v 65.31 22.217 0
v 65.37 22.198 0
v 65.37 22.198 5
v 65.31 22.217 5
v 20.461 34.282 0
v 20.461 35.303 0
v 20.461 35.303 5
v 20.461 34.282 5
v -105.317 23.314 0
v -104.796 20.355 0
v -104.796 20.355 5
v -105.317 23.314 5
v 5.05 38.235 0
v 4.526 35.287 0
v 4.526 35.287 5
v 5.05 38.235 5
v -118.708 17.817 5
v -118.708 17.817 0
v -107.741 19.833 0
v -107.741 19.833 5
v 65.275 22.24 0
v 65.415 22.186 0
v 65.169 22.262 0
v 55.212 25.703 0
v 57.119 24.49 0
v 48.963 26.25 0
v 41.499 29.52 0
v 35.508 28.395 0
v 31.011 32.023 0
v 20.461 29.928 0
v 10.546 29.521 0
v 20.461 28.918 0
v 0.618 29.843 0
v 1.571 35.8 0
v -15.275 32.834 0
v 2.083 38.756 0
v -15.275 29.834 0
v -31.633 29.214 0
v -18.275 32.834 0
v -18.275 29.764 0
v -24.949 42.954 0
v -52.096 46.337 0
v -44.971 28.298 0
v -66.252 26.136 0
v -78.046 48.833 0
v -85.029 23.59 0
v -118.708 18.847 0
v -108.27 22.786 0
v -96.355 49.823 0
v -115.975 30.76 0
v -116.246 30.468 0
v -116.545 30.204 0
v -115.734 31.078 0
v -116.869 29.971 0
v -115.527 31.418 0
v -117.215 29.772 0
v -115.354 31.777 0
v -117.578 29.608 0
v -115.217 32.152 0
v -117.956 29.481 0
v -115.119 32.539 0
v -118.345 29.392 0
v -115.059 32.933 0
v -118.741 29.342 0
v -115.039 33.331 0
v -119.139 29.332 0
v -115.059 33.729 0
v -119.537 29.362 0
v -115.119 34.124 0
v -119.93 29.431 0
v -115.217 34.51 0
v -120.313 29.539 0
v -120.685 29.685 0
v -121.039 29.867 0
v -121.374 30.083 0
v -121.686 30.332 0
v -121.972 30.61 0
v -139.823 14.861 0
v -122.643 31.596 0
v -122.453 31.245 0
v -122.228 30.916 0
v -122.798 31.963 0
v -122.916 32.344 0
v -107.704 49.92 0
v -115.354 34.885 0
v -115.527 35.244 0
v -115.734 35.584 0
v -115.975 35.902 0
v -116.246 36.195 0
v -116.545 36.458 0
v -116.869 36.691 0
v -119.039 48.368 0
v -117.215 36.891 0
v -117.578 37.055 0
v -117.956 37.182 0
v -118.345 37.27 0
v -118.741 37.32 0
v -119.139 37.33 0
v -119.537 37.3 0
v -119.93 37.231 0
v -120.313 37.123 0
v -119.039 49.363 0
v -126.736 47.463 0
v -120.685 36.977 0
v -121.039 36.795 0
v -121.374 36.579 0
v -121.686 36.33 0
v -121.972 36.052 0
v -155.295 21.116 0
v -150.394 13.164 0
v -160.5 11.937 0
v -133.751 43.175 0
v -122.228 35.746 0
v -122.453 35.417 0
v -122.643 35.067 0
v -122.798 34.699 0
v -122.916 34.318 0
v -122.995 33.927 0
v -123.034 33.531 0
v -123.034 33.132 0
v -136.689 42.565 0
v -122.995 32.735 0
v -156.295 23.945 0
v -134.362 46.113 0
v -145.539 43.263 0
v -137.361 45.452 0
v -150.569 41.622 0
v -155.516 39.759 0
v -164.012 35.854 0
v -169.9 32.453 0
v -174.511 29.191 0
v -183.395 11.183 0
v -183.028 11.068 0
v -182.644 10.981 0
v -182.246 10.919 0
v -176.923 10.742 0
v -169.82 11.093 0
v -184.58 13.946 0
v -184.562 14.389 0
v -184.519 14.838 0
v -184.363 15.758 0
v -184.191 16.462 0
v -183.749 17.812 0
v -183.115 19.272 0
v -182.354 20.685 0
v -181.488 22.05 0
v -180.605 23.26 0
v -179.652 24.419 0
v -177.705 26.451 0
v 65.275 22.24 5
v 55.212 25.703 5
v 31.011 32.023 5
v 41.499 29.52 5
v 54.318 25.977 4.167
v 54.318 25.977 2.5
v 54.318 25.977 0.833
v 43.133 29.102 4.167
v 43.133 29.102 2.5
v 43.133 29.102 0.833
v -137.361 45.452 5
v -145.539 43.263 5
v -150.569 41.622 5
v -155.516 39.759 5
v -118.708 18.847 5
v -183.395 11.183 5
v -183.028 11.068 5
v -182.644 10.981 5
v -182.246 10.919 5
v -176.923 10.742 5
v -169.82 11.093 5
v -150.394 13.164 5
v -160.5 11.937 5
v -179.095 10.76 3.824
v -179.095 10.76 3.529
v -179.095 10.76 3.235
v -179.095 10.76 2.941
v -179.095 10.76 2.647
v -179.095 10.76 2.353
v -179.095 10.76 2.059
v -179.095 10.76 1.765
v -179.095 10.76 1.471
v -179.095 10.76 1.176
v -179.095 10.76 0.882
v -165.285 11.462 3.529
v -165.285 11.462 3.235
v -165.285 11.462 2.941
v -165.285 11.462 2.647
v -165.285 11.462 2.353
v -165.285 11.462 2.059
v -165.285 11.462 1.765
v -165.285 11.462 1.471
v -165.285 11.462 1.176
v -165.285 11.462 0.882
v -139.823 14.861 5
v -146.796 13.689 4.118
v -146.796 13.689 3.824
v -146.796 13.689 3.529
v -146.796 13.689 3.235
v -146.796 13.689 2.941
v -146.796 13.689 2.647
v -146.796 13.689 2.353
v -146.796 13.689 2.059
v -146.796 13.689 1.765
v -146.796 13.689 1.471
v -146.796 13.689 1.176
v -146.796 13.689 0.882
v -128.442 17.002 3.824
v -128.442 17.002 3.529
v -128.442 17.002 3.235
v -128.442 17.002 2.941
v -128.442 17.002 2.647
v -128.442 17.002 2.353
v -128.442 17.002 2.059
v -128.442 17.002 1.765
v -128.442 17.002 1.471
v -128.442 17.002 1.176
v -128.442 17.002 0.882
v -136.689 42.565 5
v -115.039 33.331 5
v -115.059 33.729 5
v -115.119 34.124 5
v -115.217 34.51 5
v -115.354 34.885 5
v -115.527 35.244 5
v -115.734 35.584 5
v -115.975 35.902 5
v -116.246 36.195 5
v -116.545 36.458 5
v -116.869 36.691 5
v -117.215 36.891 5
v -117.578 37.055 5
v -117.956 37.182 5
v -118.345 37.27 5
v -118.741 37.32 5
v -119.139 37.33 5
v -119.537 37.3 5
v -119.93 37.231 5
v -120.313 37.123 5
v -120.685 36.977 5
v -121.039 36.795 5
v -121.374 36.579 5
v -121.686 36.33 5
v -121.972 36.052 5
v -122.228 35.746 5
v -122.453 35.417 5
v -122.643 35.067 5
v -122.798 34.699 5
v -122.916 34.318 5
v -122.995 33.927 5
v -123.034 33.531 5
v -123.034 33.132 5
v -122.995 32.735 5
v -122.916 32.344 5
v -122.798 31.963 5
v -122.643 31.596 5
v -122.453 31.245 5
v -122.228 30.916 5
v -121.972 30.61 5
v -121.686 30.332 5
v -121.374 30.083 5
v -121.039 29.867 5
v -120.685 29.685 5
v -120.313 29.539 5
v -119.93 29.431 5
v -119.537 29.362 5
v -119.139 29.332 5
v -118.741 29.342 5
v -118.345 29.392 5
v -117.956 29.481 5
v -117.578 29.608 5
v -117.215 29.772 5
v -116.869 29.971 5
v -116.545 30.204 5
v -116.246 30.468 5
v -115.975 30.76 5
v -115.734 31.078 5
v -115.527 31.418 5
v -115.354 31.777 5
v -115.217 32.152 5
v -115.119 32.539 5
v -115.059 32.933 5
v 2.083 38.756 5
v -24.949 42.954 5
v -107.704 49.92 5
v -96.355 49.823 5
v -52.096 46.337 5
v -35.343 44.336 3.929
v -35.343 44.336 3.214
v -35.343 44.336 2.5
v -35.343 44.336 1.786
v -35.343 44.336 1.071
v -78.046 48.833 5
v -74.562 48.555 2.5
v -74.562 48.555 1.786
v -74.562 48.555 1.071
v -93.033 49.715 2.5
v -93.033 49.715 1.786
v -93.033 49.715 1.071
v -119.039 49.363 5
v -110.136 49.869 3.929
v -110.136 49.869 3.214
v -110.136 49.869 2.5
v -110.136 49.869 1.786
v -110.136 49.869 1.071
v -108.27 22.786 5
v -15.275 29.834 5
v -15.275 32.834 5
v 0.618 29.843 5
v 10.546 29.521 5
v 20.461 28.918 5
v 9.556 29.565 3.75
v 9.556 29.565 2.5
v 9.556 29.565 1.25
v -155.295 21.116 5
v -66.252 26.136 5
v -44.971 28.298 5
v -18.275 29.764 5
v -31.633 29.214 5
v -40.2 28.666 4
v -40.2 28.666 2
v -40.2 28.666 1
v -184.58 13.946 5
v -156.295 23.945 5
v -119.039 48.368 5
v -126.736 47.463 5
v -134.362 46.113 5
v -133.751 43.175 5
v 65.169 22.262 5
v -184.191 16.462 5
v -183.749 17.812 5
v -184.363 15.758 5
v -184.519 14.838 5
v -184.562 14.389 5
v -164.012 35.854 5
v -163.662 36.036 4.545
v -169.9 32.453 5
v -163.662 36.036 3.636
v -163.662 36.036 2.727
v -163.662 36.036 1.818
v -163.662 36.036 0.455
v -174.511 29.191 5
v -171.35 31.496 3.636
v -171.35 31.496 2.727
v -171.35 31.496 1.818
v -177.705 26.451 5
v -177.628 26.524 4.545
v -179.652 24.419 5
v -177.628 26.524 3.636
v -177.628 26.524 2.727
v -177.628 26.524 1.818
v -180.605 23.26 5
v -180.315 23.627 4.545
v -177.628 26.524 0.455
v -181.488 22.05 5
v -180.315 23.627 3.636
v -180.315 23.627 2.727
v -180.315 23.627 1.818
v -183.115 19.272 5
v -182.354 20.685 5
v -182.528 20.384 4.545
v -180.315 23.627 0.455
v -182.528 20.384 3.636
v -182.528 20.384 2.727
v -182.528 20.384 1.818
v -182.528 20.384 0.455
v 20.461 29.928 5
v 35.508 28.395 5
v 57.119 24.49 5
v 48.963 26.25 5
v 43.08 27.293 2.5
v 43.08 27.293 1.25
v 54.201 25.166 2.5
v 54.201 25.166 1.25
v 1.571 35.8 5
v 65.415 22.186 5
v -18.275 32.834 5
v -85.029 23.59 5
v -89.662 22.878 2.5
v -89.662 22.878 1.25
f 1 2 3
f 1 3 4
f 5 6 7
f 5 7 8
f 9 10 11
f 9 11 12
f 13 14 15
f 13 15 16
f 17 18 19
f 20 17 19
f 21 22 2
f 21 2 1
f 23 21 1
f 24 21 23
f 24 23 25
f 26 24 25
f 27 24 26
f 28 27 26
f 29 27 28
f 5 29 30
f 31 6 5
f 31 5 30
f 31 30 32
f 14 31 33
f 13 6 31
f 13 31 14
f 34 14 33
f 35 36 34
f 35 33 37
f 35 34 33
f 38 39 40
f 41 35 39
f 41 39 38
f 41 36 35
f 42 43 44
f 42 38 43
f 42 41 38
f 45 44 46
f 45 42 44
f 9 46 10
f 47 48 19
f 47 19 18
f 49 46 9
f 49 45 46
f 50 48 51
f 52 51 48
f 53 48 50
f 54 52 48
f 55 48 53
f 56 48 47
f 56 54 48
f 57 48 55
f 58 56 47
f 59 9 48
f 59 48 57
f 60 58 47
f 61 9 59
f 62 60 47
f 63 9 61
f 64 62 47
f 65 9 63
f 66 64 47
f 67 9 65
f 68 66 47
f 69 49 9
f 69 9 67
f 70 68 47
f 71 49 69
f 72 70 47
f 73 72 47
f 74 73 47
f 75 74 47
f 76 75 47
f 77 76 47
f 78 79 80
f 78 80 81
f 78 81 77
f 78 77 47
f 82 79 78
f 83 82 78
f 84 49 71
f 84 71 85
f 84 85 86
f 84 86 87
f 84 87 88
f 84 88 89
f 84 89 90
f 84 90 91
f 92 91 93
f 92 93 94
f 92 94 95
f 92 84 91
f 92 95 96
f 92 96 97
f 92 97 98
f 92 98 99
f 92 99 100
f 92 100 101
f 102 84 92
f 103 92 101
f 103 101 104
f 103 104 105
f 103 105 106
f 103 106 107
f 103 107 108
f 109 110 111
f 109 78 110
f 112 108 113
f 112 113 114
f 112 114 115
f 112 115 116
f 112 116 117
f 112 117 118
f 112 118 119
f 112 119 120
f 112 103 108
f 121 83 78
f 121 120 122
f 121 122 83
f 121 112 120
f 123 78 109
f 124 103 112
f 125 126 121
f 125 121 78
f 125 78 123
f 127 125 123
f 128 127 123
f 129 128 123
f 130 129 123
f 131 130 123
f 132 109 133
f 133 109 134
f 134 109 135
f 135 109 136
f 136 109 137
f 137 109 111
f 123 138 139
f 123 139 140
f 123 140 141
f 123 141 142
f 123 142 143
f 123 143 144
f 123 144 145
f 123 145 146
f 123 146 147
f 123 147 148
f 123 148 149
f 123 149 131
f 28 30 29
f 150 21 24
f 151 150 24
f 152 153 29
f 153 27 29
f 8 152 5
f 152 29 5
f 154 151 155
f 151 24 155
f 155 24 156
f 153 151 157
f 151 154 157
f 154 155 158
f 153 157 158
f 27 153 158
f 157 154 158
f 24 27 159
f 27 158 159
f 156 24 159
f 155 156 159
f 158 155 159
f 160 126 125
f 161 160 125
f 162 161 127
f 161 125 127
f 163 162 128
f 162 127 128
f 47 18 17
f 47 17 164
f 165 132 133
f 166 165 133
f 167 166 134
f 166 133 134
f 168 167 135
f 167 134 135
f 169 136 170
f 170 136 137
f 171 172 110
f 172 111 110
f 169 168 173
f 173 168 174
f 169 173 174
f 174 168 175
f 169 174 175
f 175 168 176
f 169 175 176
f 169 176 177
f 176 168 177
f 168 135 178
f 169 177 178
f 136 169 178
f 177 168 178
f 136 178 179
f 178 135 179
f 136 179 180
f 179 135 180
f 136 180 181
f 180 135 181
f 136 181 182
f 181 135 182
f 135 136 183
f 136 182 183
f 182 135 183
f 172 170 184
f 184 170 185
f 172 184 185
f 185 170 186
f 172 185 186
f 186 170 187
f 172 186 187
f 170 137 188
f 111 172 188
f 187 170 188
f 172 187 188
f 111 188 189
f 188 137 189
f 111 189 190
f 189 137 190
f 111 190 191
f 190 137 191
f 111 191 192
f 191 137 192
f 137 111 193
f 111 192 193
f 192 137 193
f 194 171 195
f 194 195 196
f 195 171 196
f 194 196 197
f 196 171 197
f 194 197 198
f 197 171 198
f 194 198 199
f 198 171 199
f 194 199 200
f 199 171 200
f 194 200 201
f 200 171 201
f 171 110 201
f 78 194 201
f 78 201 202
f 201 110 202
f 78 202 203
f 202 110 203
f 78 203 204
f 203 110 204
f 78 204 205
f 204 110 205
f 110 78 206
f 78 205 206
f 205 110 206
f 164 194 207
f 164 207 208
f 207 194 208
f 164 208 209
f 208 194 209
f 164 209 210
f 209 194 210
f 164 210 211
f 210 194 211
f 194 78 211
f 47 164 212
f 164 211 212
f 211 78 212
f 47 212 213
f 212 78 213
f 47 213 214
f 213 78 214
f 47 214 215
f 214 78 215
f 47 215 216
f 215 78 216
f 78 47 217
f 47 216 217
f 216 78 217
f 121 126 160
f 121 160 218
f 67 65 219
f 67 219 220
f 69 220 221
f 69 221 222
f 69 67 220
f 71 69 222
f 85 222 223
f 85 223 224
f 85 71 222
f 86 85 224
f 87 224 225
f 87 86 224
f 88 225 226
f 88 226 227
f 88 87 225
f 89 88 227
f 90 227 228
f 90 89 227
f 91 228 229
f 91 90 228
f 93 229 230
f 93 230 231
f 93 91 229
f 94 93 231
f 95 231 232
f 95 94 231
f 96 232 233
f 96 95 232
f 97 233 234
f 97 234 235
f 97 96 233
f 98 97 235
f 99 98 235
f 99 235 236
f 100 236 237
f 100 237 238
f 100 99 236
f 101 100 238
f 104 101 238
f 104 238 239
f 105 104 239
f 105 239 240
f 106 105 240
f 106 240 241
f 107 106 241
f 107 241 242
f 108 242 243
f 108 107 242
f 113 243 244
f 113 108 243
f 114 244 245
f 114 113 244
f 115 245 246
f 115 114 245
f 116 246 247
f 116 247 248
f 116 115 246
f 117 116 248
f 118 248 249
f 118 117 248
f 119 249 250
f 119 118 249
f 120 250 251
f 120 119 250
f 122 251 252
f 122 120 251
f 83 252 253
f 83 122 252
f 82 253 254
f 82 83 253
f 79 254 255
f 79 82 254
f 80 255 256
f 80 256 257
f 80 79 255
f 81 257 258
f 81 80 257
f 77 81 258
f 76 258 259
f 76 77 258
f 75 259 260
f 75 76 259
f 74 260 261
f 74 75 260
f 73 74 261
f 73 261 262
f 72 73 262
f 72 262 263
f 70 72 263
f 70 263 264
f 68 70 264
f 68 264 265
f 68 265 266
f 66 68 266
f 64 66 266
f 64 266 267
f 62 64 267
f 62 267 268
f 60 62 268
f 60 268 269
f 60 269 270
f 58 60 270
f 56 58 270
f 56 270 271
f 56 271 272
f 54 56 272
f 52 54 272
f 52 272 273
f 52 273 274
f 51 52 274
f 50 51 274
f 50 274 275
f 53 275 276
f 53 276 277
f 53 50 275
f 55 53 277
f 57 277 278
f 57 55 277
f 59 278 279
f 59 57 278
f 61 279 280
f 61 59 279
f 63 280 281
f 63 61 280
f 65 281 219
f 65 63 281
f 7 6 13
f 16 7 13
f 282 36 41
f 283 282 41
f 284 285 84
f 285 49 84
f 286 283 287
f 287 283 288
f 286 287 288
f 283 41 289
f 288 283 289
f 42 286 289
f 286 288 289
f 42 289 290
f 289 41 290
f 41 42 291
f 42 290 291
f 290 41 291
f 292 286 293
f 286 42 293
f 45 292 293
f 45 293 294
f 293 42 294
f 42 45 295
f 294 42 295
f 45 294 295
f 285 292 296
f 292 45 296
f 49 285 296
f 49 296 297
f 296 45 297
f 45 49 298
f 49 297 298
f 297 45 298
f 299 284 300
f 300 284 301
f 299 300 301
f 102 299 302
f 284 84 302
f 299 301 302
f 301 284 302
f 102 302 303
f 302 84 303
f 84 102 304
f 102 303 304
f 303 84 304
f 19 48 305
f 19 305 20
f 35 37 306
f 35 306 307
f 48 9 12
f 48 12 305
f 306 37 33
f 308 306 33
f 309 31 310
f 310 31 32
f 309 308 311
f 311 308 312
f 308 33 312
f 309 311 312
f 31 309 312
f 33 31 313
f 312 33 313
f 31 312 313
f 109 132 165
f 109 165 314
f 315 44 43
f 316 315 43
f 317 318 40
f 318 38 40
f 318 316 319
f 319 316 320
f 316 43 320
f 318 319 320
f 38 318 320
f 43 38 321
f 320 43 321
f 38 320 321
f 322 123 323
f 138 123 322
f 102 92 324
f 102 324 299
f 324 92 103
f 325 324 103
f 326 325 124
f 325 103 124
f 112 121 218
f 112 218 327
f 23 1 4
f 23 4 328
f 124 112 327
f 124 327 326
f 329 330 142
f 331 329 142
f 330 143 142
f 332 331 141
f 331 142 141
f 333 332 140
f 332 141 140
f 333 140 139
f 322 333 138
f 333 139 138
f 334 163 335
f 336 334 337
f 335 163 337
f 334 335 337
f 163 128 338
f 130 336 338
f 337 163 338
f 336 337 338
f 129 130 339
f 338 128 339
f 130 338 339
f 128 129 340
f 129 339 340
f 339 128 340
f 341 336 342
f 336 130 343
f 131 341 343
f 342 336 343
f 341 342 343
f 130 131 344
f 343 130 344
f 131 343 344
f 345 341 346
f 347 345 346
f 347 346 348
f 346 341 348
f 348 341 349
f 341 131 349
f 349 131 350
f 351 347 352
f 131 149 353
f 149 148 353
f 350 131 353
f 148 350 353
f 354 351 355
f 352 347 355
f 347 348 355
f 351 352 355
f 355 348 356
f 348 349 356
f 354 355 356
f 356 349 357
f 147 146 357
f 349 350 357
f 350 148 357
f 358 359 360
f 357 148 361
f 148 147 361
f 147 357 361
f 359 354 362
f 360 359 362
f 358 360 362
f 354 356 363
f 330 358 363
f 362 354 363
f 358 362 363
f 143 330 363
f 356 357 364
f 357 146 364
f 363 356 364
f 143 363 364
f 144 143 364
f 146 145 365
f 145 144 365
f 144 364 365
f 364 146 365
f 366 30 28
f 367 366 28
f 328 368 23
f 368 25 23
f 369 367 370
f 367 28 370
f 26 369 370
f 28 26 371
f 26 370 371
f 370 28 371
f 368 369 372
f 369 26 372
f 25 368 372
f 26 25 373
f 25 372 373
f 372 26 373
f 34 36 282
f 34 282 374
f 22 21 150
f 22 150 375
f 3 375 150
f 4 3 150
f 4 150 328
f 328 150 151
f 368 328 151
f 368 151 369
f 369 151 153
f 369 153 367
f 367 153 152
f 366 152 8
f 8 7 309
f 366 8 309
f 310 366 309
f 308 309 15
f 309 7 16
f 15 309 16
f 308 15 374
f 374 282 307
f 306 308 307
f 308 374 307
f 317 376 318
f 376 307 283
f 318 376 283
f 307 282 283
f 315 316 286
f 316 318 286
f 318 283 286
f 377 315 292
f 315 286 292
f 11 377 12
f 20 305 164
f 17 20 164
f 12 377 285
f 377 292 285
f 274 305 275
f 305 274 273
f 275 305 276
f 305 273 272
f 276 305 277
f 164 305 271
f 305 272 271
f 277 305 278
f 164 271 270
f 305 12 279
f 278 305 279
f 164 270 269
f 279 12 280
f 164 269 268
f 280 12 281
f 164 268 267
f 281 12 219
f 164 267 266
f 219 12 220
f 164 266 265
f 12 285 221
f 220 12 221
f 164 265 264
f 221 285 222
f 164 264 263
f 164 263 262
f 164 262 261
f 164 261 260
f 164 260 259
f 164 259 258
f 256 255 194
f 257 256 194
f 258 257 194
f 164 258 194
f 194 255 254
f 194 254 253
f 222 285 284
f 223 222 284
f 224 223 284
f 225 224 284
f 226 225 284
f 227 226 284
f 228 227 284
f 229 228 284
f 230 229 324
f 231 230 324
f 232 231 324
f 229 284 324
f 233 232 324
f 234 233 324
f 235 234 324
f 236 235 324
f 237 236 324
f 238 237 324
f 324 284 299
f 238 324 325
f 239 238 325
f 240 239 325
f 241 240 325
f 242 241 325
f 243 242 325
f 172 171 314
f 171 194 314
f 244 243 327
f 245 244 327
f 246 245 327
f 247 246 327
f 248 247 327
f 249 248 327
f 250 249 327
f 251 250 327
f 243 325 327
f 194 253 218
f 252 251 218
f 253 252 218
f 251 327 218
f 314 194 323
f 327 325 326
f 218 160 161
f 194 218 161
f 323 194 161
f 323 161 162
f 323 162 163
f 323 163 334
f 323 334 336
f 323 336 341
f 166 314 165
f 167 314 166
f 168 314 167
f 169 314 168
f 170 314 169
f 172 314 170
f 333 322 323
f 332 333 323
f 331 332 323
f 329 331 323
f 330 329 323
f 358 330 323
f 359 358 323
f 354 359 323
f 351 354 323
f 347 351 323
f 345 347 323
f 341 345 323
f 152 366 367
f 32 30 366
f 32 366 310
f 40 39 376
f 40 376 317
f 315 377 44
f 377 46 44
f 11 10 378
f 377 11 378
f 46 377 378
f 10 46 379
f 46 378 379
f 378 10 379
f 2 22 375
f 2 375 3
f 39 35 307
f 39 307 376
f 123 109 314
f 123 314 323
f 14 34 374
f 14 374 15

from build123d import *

# Parameters (mm, degrees)
SKETCH1_R           = 3.999999999
BOSS_EXTRUDE2_DEPTH = 5


with BuildPart() as part:
    # Sketch1 → Boss-Extrude2 (new body)
    with BuildSketch(Plane.XY):
        with BuildLine():
            Line((-15.274923413, 29.833619039), (-15.274923413, 32.833619039))
            Line((-15.274923413, 32.833619039), (-18.274923413, 32.833619039))
            Line((-18.274923413, 32.833619039), (-18.274923413, 29.764253579))
            add(Edge.make_bspline(
                [(-66.252426936, 26.136064153), (-65.99153802, 26.167490518), (-61.550040243, 26.699622457), (-52.874715524, 27.642842037), (-40.202279044, 28.718895324), (-28.651441859, 29.412825252), (-21.337967835, 29.682959943), (-18.274923413, 29.764253579)],
                knots=[0.732012022, 0.732012022, 0.732012022, 0.732012022, 0.733426689, 0.756094118, 0.778988554, 0.801889683, 0.81838539, 0.81838539, 0.81838539, 0.81838539], degree=3))
            add(Edge.make_bspline(
                [(-104.796120847, 20.355168115), (-103.559333031, 20.572720582), (-98.520663765, 21.448820944), (-89.516418694, 22.932693275), (-77.905936271, 24.657488266), (-70.092430975, 25.673501889), (-66.252426936, 26.136064153)],
                knots=[0.662061604, 0.662061604, 0.662061604, 0.662061604, 0.668822257, 0.689594964, 0.711189651, 0.732012022, 0.732012022, 0.732012022, 0.732012022], degree=3))
            Line((-104.796120847, 20.355168115), (-105.316612447, 23.314167741))
            Line((-105.316612447, 23.314167741), (-108.269681049, 22.785598135))
            Line((-108.269681049, 22.785598135), (-107.741111444, 19.832529532))
            add(Edge.make_bspline(
                [(-118.70797288, 17.816784281), (-116.449296053, 18.24080163), (-112.795049314, 18.920221392), (-109.137653616, 19.582562517), (-107.741111444, 19.832529532)],
                knots=[0.636683753, 0.636683753, 0.636683753, 0.636683753, 0.649056124, 0.656694096, 0.656694096, 0.656694096, 0.656694096], degree=3))
            Line((-118.70797288, 17.816784281), (-118.70797288, 18.846655309))
            add(Edge.make_bspline(
                [(-183.394556944, 11.182987133), (-183.269597768, 11.136643498), (-182.979327212, 11.047444159), (-182.357072613, 10.91794176), (-181.480978355, 10.844493332), (-180.310934344, 10.800500045), (-178.773368721, 10.744182309), (-176.863824927, 10.725976619), (-174.562346174, 10.805796173), (-172.239703955, 10.932232791), (-169.146965898, 11.131368159), (-165.284504809, 11.447886607), (-160.649899412, 11.910670397), (-156.019974465, 12.434658225), (-151.397129438, 13.012896286), (-145.26003141, 13.893026363), (-137.616562363, 15.236357693), (-128.260301851, 17.042564162), (-121.953662416, 18.237432565), (-118.70797288, 18.846655309)],
                knots=[0.518863676, 0.518863676, 0.518863676, 0.518863676, 0.519756125, 0.520804075, 0.522899974, 0.524995873, 0.527091772, 0.531283569, 0.535475367, 0.539667165, 0.543858963, 0.552242559, 0.560626155, 0.569009751, 0.577393346, 0.585776942, 0.602544134, 0.619311326, 0.637085452, 0.637085452, 0.637085452, 0.637085452], degree=3))
            Line((-183.394556944, 11.182987133), (-155.295131064, 21.116274472))
            Line((-155.295131064, 21.116274472), (-156.295009381, 23.944744615))
            Line((-156.295009381, 23.944744615), (-184.579710813, 13.945961444))
            add(Edge.make_bspline(
                [(-155.515782717, 39.759167392), (-158.198801988, 38.674937943), (-163.647725294, 36.211238779), (-170.146091995, 32.449410331), (-175.089444119, 28.817226184), (-178.524066381, 25.800644684), (-180.954655773, 22.934036286), (-182.562392143, 20.398985473), (-183.559377406, 18.410224133), (-184.165249843, 16.676872754), (-184.477069616, 15.262053142), (-184.565495729, 14.472335947), (-184.578634412, 14.038444976), (-184.579710813, 13.945961444)],
                knots=[0.435917337, 0.435917337, 0.435917337, 0.435917337, 0.451639409, 0.468406601, 0.476790197, 0.485173793, 0.493557388, 0.497749186, 0.501940984, 0.506132782, 0.508228681, 0.51032458, 0.510893724, 0.510893724, 0.510893724, 0.510893724], degree=3))
            add(Edge.make_bspline(
                [(-137.360746756, 45.452039662), (-140.347626388, 44.756774519), (-146.297136186, 43.145936866), (-152.294225784, 41.051484901), (-155.337429936, 39.83124117), (-155.515782717, 39.759167392)],
                knots=[0.401467303, 0.401467303, 0.401467303, 0.401467303, 0.418105026, 0.434872218, 0.435917337, 0.435917337, 0.435917337, 0.435917337], degree=3))
            Line((-137.360746756, 45.452039662), (-136.68868811, 42.564855828))
            Line((-136.68868811, 42.564855828), (-133.751456289, 43.175322491))
            Line((-133.751456289, 43.175322491), (-134.361922941, 46.112554263))
            add(Edge.make_bspline(
                [(-119.03943959, 48.367699671), (-122.101427551, 48.095199158), (-127.234989348, 47.466204387), (-132.315203048, 46.53793923), (-134.361922941, 46.112554263)],
                knots=[0.367899246, 0.367899246, 0.367899246, 0.367899246, 0.384570643, 0.395913549, 0.395913549, 0.395913549, 0.395913549], degree=3))
            Line((-119.03943959, 48.367699671), (-119.03943959, 49.362753806))
            add(Edge.make_bspline(
                [(2.083438055, 38.756140327), (-0.72889412, 39.244043897), (-6.696332714, 40.243753549), (-15.89790578, 41.668993742), (-25.558864032, 43.056561005), (-35.361070129, 44.355773078), (-45.233526647, 45.562472552), (-55.097310785, 46.685203514), (-64.8707651, 47.695636562), (-74.474266757, 48.574860292), (-83.840272575, 49.273387192), (-92.915280488, 49.753884046), (-101.648803262, 49.961384976), (-109.996100301, 49.939297857), (-115.749241876, 49.643362388), (-118.71147616, 49.391814724), (-119.03943959, 49.362753806)],
                knots=[1.14918421, 1.14918421, 1.14918421, 1.14918421, 1.164550917, 1.181757895, 1.199311955, 1.217095072, 1.234990228, 1.252856883, 1.270540594, 1.287886779, 1.304773438, 1.321101419, 1.336806063, 1.351800033, 1.366031063, 1.367803451, 1.367803451, 1.367803451, 1.367803451], degree=3))
            Line((2.083438055, 38.756140327), (1.570636408, 35.800292785))
            Line((1.570636408, 35.800292785), (4.526483923, 35.287491143))
            Line((4.526483923, 35.287491143), (5.050453634, 38.235119732))
            add(Edge.make_bspline(
                [(20.460560403, 35.302628948), (20.394409373, 35.316097767), (17.49241378, 35.906446136), (12.360542854, 36.910434115), (7.283049441, 37.838254067), (5.050453634, 38.235119732)],
                knots=[1.115627198, 1.115627198, 1.115627198, 1.115627198, 1.115990637, 1.131570422, 1.143778302, 1.143778302, 1.143778302, 1.143778302], degree=3))
            Line((20.460560403, 35.302628948), (20.460560403, 34.282075586))
            add(Edge.make_bspline(
                [(65.275097468, 22.239991987), (61.679361096, 23.640965601), (54.353421886, 26.066791161), (43.149959551, 29.165035882), (31.890085438, 31.87342955), (24.331612619, 33.492515647), (20.531307928, 34.267655777), (20.487084066, 34.276670707), (20.460560403, 34.282075586)],
                knots=[1.031789372, 1.031789372, 1.031789372, 1.031789372, 1.052705995, 1.073622619, 1.094539242, 1.115212513, 1.115309854, 1.115455866, 1.115455866, 1.115455866, 1.115455866], degree=3))
            Line((65.275097468, 22.239991987), (65.414953329, 22.185501237))
            Line((65.414953329, 22.185501237), (65.370311306, 22.197604251))
            Line((65.370311306, 22.197604251), (65.30990973, 22.216811525))
            Line((65.30990973, 22.216811525), (65.168978604, 22.261626625))
            add(Edge.make_bspline(
                [(20.460560403, 29.92806979), (24.272131516, 29.638464904), (31.828857812, 28.924140294), (43.093807963, 27.389001087), (54.218645522, 25.284722166), (61.564813063, 23.407725759), (65.168978604, 22.261626625)],
                knots=[0.887815213, 0.887815213, 0.887815213, 0.887815213, 0.908324161, 0.928537761, 0.948751361, 0.96896496, 0.96896496, 0.96896496, 0.96896496], degree=3))
            Line((20.460560403, 29.92806979), (20.460560403, 28.918286698))
            add(Edge.make_bspline(
                [(-15.274923413, 29.833619039), (-15.127043667, 29.836529068), (-10.8514258, 29.918473039), (-2.571900305, 29.953998423), (9.197726912, 29.642084048), (16.829562085, 29.195008503), (20.460560403, 28.918286698)],
                knots=[0.823770335, 0.823770335, 0.823770335, 0.823770335, 0.824566598, 0.846792285, 0.868338291, 0.887942194, 0.887942194, 0.887942194, 0.887942194], degree=3))
        make_face()
        with Locations((-119.03943959, 33.331153055)):
            Circle(SKETCH1_R, mode=Mode.SUBTRACT)
    extrude(amount=BOSS_EXTRUDE2_DEPTH)


solid = part.part
